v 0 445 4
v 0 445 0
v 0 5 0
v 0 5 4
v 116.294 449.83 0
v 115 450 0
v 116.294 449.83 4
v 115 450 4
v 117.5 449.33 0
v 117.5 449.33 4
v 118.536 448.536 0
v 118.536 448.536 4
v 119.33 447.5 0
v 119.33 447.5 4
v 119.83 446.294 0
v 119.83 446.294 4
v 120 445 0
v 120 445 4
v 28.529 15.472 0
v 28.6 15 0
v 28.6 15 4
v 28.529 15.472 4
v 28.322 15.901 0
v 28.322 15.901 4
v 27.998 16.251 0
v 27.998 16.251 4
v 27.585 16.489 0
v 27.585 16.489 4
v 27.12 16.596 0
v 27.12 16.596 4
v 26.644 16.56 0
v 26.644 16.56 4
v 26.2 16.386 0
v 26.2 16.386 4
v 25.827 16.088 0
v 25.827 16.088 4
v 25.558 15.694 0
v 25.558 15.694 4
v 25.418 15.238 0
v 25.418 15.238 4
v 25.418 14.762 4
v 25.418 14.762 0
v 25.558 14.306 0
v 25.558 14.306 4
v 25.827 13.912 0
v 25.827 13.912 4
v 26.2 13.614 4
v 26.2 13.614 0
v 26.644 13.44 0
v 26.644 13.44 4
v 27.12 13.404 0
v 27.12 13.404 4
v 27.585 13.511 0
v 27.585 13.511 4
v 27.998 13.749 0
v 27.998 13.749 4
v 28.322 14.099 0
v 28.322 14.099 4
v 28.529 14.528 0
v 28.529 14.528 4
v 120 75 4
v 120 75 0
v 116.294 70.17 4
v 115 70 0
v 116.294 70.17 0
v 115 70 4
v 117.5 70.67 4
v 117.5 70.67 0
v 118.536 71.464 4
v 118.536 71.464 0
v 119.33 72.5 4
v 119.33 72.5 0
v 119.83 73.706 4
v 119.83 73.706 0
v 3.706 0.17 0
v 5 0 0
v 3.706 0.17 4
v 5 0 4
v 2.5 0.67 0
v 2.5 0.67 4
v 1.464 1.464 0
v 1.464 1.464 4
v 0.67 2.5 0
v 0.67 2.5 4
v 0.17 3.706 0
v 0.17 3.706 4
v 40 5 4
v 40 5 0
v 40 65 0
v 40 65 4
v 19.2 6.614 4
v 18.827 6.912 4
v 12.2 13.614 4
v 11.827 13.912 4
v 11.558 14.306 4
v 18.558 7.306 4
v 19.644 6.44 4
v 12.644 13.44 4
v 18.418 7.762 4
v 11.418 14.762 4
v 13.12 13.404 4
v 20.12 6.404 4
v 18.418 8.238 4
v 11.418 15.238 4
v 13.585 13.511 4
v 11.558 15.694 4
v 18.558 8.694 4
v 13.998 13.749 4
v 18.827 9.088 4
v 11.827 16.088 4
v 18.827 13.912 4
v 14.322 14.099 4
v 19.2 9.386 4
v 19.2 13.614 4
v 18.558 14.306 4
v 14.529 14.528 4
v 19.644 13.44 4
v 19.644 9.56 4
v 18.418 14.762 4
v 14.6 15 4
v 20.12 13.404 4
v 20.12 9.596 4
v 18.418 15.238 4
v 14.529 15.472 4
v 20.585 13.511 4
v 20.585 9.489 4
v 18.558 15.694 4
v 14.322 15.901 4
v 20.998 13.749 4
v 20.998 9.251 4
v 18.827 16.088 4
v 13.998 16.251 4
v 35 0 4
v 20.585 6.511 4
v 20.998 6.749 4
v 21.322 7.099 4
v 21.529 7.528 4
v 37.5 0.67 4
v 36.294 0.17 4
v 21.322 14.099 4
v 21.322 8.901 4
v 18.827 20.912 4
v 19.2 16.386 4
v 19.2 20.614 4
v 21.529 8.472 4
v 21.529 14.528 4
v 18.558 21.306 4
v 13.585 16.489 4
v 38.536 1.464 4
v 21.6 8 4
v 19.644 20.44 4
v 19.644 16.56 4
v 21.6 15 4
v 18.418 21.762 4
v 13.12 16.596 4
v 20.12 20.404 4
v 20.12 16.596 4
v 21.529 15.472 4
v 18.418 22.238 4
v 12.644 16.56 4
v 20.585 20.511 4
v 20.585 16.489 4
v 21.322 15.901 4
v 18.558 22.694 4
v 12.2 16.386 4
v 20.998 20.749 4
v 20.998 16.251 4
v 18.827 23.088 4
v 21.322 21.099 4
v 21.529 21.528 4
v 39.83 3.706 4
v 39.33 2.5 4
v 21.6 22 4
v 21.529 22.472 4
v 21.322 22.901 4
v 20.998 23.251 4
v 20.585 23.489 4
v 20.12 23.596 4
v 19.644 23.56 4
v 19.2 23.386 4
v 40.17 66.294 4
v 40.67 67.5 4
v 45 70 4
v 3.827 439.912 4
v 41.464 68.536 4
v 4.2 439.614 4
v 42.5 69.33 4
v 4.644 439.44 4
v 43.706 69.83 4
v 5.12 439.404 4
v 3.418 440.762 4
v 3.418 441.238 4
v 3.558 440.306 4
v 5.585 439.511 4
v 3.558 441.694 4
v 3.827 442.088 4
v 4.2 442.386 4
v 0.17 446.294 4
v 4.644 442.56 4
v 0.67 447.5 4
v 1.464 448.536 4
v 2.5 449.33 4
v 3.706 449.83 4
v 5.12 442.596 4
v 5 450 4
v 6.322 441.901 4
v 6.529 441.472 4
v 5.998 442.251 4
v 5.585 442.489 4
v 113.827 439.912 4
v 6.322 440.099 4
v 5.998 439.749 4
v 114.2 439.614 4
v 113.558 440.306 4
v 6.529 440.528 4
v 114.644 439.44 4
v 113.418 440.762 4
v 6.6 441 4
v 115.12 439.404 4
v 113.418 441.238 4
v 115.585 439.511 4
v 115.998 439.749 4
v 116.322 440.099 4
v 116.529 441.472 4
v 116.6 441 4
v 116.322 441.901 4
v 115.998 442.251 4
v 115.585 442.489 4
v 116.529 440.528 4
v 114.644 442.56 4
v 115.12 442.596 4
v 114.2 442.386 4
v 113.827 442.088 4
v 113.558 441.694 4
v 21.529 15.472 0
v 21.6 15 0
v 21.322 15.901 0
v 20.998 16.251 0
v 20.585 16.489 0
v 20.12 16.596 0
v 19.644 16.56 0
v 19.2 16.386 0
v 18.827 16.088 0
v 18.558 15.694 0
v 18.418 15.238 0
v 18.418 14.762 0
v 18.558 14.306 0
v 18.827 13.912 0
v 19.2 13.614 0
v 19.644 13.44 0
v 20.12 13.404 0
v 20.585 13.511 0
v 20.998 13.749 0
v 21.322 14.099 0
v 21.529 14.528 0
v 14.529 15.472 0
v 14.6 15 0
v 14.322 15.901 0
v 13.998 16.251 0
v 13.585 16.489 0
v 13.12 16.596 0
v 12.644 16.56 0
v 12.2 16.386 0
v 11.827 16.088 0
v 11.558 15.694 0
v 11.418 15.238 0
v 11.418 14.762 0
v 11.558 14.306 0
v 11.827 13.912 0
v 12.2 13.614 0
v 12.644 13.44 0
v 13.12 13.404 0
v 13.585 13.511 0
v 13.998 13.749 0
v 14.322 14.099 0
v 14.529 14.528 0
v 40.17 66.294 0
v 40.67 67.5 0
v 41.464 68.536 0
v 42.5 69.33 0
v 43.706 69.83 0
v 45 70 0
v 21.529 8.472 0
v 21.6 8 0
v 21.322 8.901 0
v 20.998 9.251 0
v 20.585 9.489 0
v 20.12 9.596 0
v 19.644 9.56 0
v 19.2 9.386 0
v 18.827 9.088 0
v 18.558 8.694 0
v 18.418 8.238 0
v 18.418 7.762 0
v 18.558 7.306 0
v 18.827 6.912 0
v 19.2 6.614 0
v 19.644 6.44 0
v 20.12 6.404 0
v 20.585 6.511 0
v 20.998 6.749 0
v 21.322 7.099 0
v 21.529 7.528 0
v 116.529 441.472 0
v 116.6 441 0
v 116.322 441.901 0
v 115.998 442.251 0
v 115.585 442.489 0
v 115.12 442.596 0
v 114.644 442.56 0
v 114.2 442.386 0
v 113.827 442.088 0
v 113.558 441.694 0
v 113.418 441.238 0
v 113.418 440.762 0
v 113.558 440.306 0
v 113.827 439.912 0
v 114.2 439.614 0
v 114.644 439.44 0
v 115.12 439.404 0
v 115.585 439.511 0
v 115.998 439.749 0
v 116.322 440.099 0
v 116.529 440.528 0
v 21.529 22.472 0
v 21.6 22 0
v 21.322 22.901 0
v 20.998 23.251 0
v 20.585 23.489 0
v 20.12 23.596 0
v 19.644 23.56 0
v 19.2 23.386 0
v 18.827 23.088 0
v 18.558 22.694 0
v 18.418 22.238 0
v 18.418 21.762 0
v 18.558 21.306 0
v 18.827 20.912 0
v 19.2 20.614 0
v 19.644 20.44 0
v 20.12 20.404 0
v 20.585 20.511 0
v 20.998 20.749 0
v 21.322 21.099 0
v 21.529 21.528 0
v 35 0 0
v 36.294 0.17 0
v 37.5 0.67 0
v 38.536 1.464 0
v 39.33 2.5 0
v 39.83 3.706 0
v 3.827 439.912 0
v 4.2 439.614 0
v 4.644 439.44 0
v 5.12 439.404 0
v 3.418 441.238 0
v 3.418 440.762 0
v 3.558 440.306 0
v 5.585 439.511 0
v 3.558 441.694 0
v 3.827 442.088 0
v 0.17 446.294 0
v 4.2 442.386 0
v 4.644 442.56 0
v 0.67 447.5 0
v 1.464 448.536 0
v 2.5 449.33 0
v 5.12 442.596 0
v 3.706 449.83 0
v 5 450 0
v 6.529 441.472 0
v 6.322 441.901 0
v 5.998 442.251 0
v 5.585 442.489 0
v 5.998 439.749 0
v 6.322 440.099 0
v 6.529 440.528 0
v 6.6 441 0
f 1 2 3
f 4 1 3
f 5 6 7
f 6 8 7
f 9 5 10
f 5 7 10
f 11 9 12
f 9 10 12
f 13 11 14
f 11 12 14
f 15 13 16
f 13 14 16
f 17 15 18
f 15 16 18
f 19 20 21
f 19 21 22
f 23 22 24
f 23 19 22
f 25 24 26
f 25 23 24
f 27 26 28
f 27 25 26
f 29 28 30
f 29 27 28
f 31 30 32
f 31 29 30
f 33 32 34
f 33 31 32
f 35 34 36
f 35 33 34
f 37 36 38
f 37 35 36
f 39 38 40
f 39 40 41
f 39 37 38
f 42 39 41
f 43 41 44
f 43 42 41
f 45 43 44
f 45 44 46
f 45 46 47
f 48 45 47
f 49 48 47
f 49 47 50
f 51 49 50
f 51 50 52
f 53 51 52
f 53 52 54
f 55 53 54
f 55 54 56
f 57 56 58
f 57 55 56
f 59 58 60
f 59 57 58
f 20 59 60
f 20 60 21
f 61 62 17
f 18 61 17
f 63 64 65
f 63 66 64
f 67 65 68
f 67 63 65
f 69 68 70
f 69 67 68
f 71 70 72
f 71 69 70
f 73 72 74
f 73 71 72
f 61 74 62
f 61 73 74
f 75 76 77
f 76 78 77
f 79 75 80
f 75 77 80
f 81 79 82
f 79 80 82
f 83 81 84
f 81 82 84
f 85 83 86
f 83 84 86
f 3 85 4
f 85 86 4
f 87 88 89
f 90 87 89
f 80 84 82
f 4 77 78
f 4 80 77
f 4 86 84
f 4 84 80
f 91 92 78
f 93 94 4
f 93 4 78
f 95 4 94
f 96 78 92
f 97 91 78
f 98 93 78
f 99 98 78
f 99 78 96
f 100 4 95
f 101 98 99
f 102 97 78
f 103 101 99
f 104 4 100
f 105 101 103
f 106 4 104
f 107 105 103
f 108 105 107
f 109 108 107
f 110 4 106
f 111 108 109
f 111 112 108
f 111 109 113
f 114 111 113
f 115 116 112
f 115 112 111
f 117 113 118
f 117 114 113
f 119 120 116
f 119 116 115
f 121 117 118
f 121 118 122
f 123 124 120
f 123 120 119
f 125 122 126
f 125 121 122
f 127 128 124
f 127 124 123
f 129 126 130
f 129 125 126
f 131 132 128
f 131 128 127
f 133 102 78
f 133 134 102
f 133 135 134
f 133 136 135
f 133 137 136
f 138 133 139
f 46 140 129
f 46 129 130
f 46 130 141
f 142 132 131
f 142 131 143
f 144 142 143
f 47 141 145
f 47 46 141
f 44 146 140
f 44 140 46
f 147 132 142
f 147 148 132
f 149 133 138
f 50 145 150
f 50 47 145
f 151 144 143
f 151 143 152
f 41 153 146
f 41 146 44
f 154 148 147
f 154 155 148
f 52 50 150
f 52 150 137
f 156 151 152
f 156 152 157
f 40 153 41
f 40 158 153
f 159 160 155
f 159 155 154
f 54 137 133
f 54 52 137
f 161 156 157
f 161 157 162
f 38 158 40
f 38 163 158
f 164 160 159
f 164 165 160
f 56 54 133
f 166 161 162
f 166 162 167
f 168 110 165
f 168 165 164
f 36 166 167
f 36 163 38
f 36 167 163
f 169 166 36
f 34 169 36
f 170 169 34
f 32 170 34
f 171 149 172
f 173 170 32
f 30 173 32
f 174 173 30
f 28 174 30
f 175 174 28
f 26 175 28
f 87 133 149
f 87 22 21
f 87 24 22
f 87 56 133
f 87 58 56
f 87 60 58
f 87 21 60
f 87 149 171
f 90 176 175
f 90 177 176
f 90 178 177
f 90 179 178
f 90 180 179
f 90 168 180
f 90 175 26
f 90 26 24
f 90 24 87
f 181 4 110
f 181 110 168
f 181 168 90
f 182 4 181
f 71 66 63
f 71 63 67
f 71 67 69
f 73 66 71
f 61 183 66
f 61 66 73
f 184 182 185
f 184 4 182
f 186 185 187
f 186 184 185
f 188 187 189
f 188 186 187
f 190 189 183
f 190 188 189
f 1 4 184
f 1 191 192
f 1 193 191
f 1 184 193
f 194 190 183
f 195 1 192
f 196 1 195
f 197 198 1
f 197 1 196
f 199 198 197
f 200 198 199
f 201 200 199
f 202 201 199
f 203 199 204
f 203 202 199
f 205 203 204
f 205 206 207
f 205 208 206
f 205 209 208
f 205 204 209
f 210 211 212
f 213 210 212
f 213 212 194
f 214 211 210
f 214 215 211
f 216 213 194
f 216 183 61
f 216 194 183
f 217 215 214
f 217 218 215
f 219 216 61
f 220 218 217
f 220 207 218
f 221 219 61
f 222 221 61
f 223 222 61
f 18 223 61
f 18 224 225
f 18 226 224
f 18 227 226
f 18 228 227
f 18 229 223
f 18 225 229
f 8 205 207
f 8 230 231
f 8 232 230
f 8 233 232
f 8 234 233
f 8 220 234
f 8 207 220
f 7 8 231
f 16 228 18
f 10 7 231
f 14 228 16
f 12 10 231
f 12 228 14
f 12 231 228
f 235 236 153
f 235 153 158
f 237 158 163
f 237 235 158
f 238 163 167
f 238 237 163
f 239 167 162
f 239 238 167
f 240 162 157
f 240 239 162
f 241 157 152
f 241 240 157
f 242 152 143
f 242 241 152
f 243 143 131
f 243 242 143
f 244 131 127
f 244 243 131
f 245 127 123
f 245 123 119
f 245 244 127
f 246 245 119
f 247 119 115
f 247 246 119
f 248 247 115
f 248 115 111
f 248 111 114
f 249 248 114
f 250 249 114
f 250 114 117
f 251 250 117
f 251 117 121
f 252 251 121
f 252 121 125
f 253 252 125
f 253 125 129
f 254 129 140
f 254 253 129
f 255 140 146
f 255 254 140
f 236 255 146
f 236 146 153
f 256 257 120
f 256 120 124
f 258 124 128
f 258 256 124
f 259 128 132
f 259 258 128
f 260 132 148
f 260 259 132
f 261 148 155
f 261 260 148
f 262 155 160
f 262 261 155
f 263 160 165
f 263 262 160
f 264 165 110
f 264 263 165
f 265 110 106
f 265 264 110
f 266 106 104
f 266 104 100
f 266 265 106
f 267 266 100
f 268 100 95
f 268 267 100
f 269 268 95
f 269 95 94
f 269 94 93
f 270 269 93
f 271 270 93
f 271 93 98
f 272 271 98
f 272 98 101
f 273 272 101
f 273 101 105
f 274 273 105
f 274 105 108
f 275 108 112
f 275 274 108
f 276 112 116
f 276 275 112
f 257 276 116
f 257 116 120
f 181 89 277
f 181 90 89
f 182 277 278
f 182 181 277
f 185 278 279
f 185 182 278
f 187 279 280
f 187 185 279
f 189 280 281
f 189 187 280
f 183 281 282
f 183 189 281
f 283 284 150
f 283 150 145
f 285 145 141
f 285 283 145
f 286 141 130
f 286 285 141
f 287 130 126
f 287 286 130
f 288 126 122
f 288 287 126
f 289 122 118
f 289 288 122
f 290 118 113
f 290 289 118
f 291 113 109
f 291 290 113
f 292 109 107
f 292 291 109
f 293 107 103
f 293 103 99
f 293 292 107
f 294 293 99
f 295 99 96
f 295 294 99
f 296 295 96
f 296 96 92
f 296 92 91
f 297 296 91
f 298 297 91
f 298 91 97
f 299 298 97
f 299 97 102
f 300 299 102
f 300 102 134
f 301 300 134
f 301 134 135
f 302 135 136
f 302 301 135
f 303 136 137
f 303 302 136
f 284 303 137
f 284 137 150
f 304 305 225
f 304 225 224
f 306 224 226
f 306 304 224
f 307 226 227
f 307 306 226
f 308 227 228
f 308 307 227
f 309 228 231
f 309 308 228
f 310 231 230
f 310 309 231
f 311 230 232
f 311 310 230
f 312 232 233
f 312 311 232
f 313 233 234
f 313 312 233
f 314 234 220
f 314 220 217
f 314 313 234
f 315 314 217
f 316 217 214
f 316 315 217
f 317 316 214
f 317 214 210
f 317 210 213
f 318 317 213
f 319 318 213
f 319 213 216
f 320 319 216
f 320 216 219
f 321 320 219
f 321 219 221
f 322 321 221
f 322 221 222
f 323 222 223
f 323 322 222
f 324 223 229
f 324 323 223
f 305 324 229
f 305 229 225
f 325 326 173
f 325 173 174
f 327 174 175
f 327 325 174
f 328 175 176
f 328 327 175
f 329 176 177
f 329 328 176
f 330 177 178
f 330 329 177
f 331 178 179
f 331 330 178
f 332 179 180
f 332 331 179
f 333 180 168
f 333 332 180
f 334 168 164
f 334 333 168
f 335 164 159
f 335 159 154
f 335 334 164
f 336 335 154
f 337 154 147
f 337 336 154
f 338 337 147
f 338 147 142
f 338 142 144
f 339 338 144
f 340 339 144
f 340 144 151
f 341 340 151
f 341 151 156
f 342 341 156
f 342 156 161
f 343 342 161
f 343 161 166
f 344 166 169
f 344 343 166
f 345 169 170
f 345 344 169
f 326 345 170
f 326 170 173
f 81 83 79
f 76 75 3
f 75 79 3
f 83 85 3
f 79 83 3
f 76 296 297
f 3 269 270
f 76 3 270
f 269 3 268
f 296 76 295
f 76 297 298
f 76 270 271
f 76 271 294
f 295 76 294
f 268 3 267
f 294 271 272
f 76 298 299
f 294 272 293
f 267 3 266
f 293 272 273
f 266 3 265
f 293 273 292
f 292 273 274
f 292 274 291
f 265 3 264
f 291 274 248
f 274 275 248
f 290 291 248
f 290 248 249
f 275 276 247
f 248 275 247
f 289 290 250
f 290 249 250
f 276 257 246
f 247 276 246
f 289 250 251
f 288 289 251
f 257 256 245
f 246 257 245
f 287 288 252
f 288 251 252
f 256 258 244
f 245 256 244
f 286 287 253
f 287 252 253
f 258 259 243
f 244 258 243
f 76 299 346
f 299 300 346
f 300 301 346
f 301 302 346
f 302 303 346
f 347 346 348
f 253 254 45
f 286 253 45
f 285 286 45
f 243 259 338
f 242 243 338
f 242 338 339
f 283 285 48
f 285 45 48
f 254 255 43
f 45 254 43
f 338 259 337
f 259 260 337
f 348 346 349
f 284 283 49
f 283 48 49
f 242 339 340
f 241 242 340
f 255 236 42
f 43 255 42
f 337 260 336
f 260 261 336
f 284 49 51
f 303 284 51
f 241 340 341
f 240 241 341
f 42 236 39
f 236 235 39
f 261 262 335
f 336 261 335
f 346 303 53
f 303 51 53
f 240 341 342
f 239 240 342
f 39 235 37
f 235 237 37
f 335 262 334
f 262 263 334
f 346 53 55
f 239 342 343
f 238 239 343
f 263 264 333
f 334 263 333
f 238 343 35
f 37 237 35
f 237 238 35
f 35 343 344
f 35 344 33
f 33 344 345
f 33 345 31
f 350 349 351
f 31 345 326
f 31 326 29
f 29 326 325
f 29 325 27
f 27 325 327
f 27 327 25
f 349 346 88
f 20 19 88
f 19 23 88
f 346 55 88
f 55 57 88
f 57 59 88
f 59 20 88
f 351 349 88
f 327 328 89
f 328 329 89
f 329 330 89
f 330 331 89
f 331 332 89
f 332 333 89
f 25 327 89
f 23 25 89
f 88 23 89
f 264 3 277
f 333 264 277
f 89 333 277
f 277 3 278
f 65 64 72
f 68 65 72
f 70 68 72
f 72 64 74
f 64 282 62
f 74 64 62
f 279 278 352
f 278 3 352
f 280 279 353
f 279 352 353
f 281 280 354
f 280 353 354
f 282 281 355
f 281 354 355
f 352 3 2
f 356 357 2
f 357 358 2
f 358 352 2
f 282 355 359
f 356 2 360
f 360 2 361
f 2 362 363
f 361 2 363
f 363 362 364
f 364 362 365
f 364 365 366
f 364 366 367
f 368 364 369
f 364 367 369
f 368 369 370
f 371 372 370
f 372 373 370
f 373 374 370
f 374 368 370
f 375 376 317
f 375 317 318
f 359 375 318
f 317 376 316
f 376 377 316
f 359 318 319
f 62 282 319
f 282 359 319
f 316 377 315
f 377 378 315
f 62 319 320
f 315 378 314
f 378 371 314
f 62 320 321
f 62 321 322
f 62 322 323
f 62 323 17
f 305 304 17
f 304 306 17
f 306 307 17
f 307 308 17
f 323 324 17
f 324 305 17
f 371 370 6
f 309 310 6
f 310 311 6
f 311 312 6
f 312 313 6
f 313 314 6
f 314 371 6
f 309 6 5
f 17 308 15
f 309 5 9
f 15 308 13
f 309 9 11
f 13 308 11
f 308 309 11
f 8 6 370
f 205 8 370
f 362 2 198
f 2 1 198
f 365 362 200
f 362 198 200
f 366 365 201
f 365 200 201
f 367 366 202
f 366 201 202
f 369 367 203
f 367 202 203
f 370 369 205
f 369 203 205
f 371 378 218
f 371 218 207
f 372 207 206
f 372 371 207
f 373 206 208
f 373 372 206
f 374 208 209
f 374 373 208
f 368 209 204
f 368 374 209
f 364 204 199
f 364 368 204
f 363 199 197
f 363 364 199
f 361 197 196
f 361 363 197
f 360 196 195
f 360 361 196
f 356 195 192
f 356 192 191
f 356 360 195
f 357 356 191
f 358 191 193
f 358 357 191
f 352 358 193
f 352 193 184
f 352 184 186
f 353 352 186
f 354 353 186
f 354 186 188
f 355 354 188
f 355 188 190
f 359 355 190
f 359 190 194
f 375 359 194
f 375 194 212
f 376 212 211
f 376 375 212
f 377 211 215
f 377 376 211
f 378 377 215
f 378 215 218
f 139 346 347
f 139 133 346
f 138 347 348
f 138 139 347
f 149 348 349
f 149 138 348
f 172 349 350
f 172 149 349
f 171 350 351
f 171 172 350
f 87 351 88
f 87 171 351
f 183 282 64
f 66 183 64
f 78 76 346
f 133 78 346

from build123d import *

# Parameters (mm, degrees)
SKETCH_2_R      = 1.6
EXTRUDE_1_DEPTH = 4
FILLET_1_R      = 5


with BuildPart() as part:
    # 草图2 → 凸台-拉伸1 (new body)
    with BuildSketch(Plane.XY):
        Polygon((0, 0), (40, 0), (40, 70), (120, 70), (120, 450), (40, 450), (0, 450), align=None)
        with Locations((20, 8)):
            Circle(SKETCH_2_R, mode=Mode.SUBTRACT)
        with Locations((20, 22)):
            Circle(SKETCH_2_R, mode=Mode.SUBTRACT)
        with Locations((27, 15)):
            Circle(SKETCH_2_R, mode=Mode.SUBTRACT)
        with Locations((13, 15)):
            Circle(SKETCH_2_R, mode=Mode.SUBTRACT)
        with Locations((20, 15)):
            Circle(SKETCH_2_R, mode=Mode.SUBTRACT)
        with Locations((115, 441)):
            Circle(SKETCH_2_R, mode=Mode.SUBTRACT)
        with Locations((5, 441)):
            Circle(SKETCH_2_R, mode=Mode.SUBTRACT)
    extrude(amount=EXTRUDE_1_DEPTH)

    # 圆角1
    fillet_1_edges = [part.edges().sort_by_distance(p)[0] for p in [
        (0, 450, 2),
        (120, 450, 2),
        (120, 70, 2),
        (40, 70, 2),
        (40, 0, 2),
        (0, 0, 2),
    ]]
    fillet(fillet_1_edges, radius=FILLET_1_R)


solid = part.part
